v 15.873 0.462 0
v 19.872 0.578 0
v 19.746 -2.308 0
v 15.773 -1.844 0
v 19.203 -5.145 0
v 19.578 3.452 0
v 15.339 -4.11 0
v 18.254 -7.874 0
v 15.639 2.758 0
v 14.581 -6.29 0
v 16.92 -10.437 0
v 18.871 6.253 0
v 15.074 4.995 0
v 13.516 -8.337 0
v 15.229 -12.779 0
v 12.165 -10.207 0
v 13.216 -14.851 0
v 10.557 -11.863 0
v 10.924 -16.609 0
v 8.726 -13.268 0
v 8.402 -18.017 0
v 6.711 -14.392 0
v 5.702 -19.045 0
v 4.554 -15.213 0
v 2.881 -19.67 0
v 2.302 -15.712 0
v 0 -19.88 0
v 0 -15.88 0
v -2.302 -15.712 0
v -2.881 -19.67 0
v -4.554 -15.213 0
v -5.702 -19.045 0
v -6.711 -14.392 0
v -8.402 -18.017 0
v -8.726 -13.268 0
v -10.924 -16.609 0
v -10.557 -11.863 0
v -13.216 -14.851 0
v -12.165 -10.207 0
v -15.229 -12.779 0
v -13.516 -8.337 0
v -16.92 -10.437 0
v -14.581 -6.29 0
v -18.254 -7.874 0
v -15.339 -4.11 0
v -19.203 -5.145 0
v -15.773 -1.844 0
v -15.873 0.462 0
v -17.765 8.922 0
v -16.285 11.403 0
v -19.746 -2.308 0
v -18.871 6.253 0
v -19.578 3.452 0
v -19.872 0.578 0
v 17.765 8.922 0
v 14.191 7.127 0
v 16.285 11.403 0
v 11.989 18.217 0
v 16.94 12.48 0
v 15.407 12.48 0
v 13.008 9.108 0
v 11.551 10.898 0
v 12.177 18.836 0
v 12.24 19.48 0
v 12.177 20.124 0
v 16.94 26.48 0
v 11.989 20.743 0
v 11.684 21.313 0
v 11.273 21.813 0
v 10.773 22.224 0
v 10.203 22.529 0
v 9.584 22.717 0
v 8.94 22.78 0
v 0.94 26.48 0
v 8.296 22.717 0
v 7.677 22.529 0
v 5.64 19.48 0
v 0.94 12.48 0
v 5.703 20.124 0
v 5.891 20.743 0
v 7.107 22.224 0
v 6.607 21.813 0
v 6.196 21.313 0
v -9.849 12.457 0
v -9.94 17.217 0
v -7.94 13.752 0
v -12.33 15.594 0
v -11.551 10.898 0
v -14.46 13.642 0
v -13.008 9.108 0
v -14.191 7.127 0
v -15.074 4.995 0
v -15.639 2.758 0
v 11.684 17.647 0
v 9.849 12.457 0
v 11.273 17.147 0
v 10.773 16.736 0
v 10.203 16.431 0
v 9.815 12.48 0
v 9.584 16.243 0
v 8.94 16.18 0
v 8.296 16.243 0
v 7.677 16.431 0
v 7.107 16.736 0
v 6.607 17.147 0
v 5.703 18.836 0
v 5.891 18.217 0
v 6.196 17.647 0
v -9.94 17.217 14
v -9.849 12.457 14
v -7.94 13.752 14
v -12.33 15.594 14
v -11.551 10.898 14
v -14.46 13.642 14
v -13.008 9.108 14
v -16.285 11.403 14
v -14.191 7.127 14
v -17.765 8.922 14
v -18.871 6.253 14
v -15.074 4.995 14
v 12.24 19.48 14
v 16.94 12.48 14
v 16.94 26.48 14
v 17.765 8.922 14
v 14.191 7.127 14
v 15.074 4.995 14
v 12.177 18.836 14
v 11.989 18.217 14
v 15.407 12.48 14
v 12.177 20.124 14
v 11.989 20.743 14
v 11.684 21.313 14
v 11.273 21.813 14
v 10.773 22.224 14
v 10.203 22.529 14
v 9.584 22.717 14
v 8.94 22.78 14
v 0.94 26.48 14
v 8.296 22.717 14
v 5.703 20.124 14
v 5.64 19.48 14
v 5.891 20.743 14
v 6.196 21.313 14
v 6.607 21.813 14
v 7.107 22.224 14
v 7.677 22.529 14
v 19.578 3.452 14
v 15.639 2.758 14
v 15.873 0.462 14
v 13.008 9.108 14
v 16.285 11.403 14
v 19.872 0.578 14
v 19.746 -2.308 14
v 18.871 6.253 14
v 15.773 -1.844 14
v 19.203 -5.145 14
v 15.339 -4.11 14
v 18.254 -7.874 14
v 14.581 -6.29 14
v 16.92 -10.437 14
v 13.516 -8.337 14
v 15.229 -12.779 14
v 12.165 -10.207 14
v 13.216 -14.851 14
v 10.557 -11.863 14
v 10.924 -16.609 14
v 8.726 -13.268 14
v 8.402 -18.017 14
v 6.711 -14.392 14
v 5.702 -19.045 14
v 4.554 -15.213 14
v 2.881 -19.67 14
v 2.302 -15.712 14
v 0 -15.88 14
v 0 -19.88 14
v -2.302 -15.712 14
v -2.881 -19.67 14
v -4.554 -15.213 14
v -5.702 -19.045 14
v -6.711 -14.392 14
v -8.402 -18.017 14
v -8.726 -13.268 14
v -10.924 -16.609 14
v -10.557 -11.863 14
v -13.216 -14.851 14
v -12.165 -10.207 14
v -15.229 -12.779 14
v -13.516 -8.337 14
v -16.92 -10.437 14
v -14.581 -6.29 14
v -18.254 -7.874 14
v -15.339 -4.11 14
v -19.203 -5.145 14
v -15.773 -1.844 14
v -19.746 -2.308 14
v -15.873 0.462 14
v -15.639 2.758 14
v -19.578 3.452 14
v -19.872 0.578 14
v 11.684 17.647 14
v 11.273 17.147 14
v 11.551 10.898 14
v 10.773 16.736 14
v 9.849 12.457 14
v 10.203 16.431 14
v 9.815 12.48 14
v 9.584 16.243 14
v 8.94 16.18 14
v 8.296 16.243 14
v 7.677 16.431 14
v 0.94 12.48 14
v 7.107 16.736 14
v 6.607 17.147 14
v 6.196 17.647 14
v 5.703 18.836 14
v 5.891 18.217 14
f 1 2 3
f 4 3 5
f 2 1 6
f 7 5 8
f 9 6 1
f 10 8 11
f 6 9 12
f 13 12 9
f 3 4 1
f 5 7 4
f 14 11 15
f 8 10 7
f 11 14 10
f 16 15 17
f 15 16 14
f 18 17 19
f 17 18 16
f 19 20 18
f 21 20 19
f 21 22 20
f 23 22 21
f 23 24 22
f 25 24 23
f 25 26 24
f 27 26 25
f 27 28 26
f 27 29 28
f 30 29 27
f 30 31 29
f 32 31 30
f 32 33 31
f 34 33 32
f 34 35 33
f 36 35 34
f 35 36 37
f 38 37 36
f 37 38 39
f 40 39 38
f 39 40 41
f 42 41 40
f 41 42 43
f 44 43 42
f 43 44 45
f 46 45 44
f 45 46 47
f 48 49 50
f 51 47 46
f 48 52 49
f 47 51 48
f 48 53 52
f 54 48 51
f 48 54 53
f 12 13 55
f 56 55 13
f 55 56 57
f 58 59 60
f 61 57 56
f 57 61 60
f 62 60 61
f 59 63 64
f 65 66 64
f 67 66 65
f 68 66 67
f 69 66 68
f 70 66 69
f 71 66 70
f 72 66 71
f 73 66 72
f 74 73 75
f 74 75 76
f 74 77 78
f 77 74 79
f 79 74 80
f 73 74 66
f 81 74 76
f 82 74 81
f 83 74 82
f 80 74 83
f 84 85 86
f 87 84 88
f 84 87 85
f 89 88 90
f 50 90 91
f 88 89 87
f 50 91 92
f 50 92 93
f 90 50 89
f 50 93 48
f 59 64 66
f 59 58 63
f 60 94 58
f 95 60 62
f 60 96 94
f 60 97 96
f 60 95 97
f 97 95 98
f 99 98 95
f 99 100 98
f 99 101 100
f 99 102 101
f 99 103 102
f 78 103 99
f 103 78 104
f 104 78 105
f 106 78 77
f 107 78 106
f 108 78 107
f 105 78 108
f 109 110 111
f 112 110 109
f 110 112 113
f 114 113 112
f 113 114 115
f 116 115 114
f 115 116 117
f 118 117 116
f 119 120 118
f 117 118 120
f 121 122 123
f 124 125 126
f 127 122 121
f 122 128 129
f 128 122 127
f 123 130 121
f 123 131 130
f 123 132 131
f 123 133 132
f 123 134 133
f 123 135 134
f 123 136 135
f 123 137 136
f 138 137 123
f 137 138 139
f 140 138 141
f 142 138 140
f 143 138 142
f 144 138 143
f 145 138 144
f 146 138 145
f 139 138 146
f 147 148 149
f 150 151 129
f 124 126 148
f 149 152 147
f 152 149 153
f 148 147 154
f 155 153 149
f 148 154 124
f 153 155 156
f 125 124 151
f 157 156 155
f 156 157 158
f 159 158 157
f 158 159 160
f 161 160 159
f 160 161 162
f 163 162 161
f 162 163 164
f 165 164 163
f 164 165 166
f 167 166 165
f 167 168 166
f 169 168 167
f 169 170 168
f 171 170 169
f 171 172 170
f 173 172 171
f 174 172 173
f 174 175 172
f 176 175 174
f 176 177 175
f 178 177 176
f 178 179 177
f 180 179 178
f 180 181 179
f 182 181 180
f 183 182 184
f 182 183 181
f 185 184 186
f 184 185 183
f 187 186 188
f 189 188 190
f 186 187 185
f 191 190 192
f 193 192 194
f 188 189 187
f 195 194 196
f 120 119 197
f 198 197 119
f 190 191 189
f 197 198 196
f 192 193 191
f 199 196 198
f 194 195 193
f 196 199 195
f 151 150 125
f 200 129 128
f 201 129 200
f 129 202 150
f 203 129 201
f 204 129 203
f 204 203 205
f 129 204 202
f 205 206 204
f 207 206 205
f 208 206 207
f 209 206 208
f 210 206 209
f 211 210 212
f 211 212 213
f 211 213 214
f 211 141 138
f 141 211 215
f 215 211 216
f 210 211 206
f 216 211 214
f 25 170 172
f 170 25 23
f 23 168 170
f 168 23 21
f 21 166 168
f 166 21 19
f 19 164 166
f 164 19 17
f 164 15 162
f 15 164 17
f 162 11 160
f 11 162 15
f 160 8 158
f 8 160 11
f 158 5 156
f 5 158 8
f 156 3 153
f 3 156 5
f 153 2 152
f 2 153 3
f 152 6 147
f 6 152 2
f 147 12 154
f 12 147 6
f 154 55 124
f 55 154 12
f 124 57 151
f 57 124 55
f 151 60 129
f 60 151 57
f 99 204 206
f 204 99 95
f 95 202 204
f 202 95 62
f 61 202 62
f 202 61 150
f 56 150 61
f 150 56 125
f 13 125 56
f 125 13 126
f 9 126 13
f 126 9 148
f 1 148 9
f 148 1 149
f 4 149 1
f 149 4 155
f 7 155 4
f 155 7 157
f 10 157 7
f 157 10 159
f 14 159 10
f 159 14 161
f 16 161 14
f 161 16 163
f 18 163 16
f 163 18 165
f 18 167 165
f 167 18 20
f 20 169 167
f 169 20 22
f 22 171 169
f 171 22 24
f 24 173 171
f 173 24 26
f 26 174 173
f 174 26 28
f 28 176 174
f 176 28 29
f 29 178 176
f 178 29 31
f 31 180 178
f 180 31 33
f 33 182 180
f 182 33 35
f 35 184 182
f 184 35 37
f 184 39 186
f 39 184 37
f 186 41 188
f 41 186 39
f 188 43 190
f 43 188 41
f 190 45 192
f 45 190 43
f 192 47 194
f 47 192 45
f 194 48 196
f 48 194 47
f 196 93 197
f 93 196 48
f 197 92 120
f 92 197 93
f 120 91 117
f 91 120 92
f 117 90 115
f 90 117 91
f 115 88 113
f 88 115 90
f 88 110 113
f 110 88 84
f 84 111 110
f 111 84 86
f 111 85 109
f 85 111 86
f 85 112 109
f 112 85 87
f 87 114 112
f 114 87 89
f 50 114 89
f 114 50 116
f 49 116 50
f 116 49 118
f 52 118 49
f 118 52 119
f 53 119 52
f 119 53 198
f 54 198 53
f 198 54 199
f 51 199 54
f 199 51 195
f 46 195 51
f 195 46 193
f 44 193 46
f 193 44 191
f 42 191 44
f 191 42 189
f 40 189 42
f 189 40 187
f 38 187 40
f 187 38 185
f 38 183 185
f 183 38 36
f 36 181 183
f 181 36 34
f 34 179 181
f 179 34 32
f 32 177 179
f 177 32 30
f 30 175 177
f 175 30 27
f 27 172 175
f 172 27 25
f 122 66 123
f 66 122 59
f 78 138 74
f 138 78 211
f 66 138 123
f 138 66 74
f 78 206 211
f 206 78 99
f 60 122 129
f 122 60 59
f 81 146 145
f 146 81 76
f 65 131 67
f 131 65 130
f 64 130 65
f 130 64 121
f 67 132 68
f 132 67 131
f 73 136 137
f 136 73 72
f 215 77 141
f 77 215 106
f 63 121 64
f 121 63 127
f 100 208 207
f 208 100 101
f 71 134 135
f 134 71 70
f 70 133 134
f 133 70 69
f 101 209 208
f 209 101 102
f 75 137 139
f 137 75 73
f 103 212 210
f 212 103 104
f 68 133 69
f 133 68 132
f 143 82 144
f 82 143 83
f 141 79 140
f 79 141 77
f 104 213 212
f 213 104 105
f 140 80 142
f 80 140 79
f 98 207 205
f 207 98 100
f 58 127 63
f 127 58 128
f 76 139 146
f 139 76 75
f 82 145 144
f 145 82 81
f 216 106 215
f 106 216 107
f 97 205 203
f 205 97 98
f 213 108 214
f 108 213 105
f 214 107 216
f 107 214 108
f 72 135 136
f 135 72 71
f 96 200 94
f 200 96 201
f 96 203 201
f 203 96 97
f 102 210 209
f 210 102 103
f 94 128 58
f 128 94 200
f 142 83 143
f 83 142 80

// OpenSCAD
$fn = 32;

// ----------------------------------------------------------------------
// Pipe clamp: 39.76 mm ring, 4 mm wall, 14 mm wide
// ----------------------------------------------------------------------

// --- parameters (mm) ---
outer_r = 19.88;          // clamp outside radius
inner_r = 15.88;          // pipe bore radius
band = 4;                 // band thickness
clamp_w = 14;             // clamp width
opening = 60;             // opening angle between the ends
lug_w = 16;               // lug width
lug_len = 14;             // lug length
bolt_d = 6.6;             // bolt hole

clamp_profile = [[-9.94, 17.217], [-12.33, 15.594], [-14.46, 13.642], [-16.285, 11.403], [-17.765, 8.922], [-18.871, 6.253], [-19.578, 3.452], [-19.872, 0.578], [-19.746, -2.308], [-19.203, -5.145], [-18.254, -7.874], [-16.92, -10.437], [-15.229, -12.779], [-13.216, -14.851], [-10.924, -16.609], [-8.402, -18.017], [-5.702, -19.045], [-2.881, -19.67], [0, -19.88], [2.881, -19.67], [5.702, -19.045], [8.402, -18.017], [10.924, -16.609], [13.216, -14.851], [15.229, -12.779], [16.92, -10.437], [18.254, -7.874], [19.203, -5.145], [19.746, -2.308], [19.872, 0.578], [19.578, 3.452], [18.871, 6.253], [17.765, 8.922], [16.285, 11.403], [14.46, 13.642], [12.33, 15.594], [9.94, 17.217], [7.94, 13.752], [9.849, 12.457], [11.551, 10.898], [13.008, 9.108], [14.191, 7.127], [15.074, 4.995], [15.639, 2.758], [15.873, 0.462], [15.773, -1.844], [15.339, -4.11], [14.581, -6.29], [13.516, -8.337], [12.165, -10.207], [10.557, -11.863], [8.726, -13.268], [6.711, -14.392], [4.554, -15.213], [2.302, -15.712], [0, -15.88], [-2.302, -15.712], [-4.554, -15.213], [-6.711, -14.392], [-8.726, -13.268], [-10.557, -11.863], [-12.165, -10.207], [-13.516, -8.337], [-14.581, -6.29], [-15.339, -4.11], [-15.773, -1.844], [-15.873, 0.462], [-15.639, 2.758], [-15.074, 4.995], [-14.191, 7.127], [-13.008, 9.108], [-11.551, 10.898], [-9.849, 12.457], [-7.94, 13.752]];

difference() {
  union() {
    linear_extrude(height = clamp_w) polygon(clamp_profile);
    /* bolt lug on the other end */
    translate([0.94, 12.48, 0]) cube([lug_w, 14, clamp_w]);
  }
  translate([8.94, 19.48, -2.5]) cylinder(h = clamp_w + 5, d = bolt_d);
}
